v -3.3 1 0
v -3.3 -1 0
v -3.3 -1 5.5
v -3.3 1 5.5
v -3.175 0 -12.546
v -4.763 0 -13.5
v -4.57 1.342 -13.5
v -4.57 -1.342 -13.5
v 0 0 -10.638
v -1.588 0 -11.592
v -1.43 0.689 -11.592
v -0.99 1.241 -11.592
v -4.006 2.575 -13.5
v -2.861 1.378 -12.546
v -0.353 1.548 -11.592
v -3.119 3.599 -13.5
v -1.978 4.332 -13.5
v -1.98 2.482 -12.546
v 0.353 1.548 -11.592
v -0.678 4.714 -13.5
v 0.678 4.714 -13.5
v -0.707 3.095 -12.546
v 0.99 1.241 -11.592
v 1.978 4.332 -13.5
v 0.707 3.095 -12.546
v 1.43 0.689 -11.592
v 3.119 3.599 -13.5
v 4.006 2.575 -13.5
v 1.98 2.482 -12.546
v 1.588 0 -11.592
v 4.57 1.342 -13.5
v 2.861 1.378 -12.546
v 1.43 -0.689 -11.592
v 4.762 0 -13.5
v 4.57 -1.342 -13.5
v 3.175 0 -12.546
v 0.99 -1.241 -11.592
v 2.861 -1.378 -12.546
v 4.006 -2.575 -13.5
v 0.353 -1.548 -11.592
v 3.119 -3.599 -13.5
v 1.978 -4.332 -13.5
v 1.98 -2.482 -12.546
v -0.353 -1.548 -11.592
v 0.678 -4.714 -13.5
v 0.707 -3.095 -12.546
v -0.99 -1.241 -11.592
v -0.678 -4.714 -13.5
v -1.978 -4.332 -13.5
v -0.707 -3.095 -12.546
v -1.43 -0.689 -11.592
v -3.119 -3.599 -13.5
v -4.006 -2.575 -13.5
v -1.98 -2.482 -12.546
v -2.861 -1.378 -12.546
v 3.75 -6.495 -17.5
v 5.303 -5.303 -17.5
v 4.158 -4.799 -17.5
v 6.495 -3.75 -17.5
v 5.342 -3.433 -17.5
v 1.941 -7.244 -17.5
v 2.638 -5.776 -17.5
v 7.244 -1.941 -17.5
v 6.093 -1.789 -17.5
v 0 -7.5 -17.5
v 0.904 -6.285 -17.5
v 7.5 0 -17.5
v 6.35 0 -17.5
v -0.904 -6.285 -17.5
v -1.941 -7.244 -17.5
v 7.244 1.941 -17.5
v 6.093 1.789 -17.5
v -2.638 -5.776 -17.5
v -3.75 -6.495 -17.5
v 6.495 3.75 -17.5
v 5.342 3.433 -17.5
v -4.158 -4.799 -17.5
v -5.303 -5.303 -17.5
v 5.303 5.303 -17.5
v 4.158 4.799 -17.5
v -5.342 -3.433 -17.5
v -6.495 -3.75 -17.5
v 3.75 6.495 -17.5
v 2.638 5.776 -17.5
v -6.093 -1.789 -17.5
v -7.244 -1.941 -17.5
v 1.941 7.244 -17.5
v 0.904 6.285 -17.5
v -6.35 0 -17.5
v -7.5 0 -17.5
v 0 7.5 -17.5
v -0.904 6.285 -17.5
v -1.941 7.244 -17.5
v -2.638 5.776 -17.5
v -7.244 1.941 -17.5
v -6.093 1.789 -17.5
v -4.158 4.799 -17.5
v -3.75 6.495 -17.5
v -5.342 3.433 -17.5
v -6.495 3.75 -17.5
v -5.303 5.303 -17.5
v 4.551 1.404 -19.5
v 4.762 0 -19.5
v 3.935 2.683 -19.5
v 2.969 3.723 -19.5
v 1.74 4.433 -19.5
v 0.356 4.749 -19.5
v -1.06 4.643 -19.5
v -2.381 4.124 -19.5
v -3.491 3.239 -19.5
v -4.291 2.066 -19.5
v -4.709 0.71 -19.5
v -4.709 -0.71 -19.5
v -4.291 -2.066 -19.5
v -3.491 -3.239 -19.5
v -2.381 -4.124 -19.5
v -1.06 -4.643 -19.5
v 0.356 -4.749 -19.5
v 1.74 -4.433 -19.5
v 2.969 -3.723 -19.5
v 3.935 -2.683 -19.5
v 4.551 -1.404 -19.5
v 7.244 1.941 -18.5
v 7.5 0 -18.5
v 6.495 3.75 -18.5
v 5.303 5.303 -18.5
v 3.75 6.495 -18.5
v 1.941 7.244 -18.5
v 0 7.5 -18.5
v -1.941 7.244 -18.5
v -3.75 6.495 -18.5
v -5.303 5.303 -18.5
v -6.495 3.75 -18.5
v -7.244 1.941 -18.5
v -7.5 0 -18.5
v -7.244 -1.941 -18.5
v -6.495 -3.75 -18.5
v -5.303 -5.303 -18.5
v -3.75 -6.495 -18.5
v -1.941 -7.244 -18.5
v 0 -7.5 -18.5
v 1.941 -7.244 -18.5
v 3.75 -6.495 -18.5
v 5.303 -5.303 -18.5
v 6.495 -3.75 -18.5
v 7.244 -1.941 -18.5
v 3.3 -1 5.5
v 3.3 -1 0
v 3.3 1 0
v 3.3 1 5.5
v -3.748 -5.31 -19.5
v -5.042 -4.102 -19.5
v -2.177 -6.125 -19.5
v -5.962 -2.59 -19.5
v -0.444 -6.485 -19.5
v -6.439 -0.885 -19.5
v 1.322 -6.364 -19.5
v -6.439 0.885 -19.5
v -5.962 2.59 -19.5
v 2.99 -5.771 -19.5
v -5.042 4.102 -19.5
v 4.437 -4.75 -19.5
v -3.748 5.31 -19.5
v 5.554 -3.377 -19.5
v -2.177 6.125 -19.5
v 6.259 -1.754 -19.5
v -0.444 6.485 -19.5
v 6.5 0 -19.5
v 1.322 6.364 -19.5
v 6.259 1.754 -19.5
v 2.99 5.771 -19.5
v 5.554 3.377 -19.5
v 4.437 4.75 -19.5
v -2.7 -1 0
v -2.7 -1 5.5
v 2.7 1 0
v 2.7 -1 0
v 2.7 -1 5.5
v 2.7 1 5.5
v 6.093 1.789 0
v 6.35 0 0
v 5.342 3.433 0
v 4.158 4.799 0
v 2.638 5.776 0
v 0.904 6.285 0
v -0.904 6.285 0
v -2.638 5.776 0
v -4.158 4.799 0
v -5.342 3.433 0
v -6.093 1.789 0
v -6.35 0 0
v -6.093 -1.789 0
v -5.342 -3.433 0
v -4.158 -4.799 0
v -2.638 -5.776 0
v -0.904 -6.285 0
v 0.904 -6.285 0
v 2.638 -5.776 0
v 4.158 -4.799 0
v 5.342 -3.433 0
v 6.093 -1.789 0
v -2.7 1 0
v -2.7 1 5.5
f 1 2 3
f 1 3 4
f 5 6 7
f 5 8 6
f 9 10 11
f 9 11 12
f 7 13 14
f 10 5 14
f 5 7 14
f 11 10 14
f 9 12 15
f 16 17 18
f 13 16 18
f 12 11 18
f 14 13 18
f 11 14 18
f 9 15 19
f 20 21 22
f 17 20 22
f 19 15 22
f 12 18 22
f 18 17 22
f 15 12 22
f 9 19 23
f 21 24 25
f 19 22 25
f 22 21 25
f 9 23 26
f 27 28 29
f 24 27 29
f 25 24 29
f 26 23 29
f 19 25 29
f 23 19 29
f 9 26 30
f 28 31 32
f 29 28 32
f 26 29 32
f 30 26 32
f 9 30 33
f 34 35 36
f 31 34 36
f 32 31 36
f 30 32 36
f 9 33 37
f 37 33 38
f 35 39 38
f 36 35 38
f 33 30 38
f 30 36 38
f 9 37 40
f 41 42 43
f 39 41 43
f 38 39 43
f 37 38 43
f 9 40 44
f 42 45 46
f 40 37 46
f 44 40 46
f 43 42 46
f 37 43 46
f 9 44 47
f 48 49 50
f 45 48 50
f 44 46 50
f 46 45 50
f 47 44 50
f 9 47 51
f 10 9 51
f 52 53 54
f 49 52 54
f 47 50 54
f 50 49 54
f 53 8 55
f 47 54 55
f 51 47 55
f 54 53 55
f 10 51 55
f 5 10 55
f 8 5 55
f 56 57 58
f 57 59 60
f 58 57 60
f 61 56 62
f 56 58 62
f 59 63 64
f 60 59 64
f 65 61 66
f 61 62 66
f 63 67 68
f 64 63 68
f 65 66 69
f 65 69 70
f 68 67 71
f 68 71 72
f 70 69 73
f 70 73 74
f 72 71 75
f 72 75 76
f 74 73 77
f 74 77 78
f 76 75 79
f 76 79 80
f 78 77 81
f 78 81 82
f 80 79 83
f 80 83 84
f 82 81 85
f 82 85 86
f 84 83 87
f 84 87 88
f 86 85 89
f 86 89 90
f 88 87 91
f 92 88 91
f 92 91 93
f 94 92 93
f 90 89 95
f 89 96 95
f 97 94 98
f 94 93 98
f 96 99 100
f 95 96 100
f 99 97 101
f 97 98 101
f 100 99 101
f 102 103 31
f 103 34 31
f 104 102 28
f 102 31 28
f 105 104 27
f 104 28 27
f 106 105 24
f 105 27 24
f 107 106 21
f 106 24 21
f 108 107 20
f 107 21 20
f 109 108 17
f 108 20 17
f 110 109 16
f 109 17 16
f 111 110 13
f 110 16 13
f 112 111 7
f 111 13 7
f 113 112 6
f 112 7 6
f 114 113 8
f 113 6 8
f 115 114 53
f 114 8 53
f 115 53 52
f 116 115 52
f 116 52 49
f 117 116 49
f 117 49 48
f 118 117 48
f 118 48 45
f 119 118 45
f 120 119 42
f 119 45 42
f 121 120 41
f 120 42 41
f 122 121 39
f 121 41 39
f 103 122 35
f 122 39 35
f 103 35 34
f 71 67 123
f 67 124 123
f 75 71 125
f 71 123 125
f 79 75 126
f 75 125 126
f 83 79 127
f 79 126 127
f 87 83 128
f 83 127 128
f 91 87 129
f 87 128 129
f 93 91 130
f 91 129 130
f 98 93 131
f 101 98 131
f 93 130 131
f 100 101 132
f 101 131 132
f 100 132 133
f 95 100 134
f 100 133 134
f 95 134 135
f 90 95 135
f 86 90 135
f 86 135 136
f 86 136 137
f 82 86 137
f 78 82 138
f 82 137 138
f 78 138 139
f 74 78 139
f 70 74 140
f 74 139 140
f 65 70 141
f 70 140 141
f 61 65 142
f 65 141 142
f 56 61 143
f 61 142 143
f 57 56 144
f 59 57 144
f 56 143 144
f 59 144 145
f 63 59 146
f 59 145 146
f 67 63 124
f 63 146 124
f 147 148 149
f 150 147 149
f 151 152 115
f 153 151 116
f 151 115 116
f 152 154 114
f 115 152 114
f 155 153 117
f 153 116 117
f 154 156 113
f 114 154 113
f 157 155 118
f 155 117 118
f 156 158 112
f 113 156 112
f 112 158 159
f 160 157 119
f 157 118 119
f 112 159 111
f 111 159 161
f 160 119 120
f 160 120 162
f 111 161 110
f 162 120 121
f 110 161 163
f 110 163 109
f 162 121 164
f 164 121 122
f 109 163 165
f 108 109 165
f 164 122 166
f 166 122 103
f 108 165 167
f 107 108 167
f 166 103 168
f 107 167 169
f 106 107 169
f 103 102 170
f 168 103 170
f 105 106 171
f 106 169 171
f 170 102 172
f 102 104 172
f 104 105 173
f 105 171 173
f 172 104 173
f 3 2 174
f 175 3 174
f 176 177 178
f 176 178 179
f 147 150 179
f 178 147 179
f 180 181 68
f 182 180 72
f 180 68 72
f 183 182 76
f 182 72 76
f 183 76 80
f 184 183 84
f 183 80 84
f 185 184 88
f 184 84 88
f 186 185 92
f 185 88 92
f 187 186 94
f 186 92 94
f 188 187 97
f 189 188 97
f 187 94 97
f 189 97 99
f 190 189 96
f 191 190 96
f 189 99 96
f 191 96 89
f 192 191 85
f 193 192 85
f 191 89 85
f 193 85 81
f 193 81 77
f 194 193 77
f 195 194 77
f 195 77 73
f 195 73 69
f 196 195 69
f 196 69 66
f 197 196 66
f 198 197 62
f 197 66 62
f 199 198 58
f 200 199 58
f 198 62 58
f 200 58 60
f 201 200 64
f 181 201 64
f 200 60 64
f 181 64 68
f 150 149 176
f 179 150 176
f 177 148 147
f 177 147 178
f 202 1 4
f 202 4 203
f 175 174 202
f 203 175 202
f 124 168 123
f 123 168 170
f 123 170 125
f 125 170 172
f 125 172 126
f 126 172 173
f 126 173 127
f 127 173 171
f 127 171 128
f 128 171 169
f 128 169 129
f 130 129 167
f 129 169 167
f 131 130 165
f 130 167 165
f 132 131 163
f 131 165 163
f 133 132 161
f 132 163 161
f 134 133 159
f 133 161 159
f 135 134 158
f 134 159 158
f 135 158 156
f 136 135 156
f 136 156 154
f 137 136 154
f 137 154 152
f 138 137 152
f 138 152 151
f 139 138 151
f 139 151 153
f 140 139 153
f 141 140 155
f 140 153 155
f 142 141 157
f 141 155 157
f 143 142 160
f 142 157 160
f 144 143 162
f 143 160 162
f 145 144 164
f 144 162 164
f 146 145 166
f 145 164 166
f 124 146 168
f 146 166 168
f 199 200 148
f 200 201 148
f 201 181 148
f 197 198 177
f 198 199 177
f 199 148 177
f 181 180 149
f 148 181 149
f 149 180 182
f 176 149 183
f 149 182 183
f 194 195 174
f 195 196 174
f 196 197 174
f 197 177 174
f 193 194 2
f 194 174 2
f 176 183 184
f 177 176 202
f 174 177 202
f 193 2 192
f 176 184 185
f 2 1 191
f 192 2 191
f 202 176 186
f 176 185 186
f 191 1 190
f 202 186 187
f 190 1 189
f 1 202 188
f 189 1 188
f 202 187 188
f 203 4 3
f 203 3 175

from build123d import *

# Parameters (mm, degrees)
F_3_8_0_375_DIAMETER_HOLE1_D     = 9.525
F_3_8_0_375_DIAMETER_HOLE1_DEPTH = 5.999988
F_3_8_0_375_DIAMETER_HOLE1_TIP   = 2.861598698
SKETCH6_W                        = 0.6
SKETCH6_H                        = 2
BOSS_EXTRUDE1_DEPTH              = 5.5


with BuildPart() as part:
    # Sketch1 → Revolve2 (revolve)
    with BuildSketch(Plane(origin=(0, 0, 0), x_dir=(1, 0, 0), z_dir=(0, 1, 0))):
        Polygon((0, 0), (6.35, 0), (6.35, 17.5), (7.5, 17.5), (7.5, 18.5), (6.5, 19.5), (0, 19.5), align=None)
    revolve(axis=Axis((0, 0, -19.5), (0, 0, 1)))

    # 3/8 (0.375) Diameter Hole1
    with Locations(Plane(origin=(0, 0, -19.5), x_dir=(-1, 0, 0), z_dir=(0, 0, -1))):
        with Locations((0, 0)):
            Hole(F_3_8_0_375_DIAMETER_HOLE1_D / 2, depth=F_3_8_0_375_DIAMETER_HOLE1_DEPTH)
            with Locations((0, 0, -(F_3_8_0_375_DIAMETER_HOLE1_DEPTH + F_3_8_0_375_DIAMETER_HOLE1_TIP / 2))):  # 118° drill point
                Cone(0, F_3_8_0_375_DIAMETER_HOLE1_D / 2, F_3_8_0_375_DIAMETER_HOLE1_TIP, mode=Mode.SUBTRACT)

    # Sketch6 → Boss-Extrude1 (add)
    with BuildSketch(Plane.XY):
        with Locations((-3, 0)):
            Rectangle(SKETCH6_W, SKETCH6_H)
    boss_extrude1 = extrude(amount=BOSS_EXTRUDE1_DEPTH)

    # Mirror1: Boss-Extrude1 across plane
    add(boss_extrude1.mirror(Plane(origin=(0, 0, 0), x_dir=(0, 0, 1), z_dir=(1, 0, 0))))


solid = part.part
